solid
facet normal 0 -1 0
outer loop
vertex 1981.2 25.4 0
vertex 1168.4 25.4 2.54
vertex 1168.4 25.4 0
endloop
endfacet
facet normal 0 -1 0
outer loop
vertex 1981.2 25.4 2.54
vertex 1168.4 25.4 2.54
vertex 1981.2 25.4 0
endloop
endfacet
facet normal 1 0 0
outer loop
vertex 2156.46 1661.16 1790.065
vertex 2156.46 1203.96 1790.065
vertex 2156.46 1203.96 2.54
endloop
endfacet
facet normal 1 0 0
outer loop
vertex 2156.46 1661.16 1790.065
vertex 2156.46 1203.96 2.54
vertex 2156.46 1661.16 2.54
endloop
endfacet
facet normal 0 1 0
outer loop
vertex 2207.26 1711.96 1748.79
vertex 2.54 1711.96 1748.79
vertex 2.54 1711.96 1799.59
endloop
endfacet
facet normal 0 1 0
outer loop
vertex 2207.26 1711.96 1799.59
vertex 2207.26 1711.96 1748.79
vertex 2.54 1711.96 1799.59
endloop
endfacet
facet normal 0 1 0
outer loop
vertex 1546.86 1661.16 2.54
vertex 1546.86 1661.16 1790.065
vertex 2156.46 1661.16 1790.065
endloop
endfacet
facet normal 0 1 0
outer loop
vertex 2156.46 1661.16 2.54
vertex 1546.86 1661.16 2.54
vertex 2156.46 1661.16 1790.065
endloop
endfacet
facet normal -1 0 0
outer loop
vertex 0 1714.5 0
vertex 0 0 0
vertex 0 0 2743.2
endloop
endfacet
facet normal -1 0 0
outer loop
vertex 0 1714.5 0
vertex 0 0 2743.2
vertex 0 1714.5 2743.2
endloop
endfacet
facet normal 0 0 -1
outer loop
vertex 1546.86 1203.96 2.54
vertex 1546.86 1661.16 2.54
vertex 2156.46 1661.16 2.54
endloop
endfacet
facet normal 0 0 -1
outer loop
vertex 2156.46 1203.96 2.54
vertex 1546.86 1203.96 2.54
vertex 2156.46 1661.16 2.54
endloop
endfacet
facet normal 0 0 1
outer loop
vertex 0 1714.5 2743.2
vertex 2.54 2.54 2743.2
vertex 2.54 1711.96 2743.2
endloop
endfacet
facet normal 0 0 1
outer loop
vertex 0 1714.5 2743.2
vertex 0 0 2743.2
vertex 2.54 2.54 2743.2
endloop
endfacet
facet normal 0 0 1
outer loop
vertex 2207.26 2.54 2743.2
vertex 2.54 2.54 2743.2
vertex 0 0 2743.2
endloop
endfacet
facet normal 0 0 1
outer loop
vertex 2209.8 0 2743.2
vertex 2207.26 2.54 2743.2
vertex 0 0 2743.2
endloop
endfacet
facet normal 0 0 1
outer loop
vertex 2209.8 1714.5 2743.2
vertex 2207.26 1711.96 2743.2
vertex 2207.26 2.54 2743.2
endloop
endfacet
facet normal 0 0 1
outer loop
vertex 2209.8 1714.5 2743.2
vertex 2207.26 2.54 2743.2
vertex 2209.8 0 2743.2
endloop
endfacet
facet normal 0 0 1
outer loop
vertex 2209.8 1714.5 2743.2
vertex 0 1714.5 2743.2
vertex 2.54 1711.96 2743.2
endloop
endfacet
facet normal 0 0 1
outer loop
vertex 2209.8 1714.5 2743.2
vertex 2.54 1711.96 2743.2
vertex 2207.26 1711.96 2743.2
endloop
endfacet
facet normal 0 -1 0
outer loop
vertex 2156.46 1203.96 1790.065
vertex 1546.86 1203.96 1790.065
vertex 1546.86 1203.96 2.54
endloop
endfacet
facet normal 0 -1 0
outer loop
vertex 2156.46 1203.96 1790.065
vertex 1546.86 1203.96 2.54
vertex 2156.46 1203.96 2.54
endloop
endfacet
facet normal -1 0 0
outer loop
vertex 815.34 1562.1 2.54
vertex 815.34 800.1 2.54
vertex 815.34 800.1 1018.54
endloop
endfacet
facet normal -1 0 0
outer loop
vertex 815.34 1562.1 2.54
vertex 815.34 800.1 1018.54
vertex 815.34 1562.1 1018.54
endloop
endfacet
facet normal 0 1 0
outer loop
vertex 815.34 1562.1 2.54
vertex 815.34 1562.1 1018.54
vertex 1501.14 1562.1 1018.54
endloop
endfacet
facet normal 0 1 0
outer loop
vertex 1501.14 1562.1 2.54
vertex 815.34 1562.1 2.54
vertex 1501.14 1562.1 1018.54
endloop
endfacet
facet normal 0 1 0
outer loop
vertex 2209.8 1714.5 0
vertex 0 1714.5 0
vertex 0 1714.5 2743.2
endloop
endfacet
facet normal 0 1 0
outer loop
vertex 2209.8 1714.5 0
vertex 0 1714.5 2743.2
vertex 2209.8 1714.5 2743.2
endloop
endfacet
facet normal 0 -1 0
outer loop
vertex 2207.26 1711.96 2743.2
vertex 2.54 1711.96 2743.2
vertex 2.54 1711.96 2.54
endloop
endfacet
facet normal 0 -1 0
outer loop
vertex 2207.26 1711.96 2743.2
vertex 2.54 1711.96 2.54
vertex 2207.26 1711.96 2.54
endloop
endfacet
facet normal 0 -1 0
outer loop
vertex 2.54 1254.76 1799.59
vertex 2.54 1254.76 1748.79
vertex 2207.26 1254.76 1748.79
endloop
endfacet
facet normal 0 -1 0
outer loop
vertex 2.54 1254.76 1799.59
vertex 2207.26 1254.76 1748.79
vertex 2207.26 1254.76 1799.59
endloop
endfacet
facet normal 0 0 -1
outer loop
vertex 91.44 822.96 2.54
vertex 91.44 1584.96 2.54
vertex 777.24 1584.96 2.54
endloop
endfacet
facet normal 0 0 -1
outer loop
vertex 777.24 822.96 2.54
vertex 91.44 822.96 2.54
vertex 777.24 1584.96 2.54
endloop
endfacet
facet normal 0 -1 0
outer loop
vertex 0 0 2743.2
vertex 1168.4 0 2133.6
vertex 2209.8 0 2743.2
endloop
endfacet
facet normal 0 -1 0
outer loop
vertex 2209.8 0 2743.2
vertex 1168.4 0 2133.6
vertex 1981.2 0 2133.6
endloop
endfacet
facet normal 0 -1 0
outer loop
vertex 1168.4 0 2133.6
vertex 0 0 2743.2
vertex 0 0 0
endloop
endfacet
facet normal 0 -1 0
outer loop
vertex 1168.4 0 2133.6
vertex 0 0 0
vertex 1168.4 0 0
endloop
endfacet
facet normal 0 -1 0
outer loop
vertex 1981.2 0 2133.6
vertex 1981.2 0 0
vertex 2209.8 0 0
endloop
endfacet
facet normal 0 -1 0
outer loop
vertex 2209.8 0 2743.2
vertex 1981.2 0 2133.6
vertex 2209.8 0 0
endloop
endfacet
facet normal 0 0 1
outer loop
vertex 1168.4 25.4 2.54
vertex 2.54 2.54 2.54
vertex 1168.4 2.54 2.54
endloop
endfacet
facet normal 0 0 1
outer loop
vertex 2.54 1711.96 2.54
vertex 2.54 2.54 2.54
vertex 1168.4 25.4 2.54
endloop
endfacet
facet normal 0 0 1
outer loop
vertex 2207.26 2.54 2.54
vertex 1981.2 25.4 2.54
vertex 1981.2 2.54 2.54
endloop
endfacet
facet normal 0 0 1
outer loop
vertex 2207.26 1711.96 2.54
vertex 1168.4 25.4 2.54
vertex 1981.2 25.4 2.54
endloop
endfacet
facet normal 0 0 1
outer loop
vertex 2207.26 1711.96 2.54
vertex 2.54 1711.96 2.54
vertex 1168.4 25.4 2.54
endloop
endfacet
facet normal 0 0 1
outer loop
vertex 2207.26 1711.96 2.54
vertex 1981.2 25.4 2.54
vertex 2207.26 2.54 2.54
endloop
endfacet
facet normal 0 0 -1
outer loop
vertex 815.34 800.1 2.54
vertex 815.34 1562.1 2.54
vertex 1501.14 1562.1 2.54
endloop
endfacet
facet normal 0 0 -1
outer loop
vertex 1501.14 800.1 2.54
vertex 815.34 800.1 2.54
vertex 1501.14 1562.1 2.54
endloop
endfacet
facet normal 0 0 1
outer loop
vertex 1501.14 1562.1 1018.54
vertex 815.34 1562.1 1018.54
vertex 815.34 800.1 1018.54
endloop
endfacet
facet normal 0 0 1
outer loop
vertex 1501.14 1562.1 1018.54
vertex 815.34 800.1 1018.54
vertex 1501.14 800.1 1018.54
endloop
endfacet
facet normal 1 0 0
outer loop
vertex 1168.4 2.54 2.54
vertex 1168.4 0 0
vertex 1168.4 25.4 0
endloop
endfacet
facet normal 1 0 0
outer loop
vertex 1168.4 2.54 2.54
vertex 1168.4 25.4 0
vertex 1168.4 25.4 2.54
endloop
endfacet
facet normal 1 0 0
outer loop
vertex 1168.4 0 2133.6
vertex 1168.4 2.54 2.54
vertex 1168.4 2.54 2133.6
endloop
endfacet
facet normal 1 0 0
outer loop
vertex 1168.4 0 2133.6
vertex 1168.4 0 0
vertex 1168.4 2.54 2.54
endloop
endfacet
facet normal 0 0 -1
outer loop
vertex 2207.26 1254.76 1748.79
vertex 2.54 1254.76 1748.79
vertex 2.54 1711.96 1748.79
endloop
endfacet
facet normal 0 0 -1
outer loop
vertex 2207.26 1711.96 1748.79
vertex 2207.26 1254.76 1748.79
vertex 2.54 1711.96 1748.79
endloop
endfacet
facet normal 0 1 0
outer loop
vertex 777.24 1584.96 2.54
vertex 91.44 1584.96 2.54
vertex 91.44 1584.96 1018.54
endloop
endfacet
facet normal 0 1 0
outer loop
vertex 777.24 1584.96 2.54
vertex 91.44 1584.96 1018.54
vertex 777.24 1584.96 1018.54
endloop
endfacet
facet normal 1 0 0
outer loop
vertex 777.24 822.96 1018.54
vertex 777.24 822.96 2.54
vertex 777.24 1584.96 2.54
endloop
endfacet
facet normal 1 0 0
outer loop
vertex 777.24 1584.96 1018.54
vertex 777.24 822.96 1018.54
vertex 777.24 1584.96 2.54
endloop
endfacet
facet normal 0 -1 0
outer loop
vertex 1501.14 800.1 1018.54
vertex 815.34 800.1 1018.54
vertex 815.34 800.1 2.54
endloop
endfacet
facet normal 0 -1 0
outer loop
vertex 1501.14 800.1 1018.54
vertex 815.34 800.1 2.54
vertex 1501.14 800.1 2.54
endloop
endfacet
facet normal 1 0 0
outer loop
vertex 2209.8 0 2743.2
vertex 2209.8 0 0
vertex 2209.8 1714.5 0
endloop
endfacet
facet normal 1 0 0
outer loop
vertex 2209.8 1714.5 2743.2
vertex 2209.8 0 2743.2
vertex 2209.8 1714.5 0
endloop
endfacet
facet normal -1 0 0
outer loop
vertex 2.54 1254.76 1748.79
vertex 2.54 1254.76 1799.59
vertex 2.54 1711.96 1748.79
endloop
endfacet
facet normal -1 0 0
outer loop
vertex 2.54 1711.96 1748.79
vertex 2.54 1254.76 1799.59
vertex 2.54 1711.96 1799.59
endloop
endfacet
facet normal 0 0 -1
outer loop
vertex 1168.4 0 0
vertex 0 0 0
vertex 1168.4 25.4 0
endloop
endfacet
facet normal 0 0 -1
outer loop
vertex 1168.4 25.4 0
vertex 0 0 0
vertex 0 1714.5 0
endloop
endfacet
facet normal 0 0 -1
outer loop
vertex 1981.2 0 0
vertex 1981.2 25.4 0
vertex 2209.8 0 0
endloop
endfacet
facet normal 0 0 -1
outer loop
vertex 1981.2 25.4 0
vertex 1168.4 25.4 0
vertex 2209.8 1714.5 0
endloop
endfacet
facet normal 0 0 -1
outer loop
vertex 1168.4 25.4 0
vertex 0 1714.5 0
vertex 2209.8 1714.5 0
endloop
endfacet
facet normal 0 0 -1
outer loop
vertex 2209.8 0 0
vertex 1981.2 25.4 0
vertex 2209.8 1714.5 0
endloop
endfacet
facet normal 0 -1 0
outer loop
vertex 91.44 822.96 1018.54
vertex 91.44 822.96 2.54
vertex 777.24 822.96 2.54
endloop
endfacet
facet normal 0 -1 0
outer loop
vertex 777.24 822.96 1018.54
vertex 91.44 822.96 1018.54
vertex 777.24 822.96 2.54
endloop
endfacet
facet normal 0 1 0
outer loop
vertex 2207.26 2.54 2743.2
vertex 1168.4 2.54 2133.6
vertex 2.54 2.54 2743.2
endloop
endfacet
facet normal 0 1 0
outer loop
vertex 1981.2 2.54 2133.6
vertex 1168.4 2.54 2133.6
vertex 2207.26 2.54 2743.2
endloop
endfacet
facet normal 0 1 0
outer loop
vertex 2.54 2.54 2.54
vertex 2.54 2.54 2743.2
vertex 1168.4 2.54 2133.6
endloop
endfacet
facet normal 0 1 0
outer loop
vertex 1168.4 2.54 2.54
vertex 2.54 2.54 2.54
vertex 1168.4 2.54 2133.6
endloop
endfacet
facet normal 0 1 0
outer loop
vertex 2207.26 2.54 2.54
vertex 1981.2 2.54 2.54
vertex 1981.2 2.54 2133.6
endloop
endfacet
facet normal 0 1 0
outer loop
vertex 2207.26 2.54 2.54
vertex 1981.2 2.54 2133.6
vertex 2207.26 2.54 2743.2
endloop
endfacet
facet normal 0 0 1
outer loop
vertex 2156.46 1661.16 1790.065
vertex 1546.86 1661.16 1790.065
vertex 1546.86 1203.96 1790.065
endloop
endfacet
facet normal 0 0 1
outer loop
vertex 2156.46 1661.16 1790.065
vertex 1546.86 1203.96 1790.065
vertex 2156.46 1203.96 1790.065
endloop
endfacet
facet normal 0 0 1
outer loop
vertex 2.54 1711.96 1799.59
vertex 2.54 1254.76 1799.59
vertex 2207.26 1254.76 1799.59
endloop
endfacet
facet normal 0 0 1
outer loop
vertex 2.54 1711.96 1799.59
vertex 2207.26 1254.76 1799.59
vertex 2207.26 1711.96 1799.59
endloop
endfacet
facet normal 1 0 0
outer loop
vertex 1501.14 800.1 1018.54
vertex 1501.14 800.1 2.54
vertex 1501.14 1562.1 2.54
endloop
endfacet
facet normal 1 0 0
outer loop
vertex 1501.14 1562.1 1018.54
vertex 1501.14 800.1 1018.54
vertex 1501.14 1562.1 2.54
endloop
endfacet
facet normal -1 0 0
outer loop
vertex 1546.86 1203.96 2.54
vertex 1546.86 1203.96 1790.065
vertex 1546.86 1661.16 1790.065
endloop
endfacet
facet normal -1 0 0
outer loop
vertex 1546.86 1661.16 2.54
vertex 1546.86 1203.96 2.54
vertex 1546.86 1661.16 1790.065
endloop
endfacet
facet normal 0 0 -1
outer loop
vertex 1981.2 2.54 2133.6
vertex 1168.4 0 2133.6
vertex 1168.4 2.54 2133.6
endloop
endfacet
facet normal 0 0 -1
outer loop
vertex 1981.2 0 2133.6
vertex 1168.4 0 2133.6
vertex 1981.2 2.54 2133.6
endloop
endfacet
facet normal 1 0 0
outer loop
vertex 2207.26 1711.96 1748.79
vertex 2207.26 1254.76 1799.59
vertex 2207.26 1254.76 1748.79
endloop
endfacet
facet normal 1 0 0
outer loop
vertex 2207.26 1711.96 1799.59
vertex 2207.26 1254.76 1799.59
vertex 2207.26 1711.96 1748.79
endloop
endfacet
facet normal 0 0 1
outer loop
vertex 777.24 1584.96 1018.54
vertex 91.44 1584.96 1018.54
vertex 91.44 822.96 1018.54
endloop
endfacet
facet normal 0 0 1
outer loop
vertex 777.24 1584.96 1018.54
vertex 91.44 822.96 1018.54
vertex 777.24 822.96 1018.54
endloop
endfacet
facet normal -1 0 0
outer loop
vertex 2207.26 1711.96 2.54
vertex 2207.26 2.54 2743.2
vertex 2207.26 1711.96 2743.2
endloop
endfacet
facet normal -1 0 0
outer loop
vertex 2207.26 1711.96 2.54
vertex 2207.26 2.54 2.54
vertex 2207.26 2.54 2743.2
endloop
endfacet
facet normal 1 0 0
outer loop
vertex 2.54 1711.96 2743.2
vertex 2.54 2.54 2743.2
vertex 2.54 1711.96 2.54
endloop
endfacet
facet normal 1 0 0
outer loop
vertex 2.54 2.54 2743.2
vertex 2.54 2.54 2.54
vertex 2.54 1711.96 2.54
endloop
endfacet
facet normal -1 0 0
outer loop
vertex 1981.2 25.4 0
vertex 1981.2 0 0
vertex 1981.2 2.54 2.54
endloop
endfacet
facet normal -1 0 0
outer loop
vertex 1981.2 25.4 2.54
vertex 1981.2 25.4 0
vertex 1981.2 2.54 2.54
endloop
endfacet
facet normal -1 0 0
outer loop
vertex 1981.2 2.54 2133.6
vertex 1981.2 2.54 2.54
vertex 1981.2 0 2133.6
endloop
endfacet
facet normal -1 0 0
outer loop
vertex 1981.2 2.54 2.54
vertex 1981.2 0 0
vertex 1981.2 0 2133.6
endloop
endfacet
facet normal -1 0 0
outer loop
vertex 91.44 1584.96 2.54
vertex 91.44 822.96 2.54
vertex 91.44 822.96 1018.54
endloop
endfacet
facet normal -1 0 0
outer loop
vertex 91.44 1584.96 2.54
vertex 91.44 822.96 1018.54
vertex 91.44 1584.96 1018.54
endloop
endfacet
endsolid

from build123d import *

# Parameters (mm, degrees)
F0_W      = 2209.8
F0_H      = 1714.5
F1_DEPTH  = 2743.2
F2_T      = -2.54
F3_W      = 812.8
F3_H      = 2133.6
F4_DEPTH  = 25.4
F5_W      = 685.8
F5_H      = 762
F6_DEPTH  = 1016
F7_W      = 457.2
F7_H      = 50.8
F8_DEPTH  = 2204.72
F9_W      = 609.6
F9_H      = 457.2
F10_DEPTH = 1787.525


with BuildPart() as f1:
    # F0 (on Top) → F1 (new body)
    with BuildSketch(Plane.XY):
        with Locations((1104.9, 857.25)):
            Rectangle(F0_W, F0_H)
    extrude(amount=F1_DEPTH)

    # F2
    f2_openings = [f1.faces().sort_by_distance(p)[0] for p in [
        (1104.9, 857.25, 2743.2),
    ]]
    offset(amount=F2_T, openings=f2_openings)

    # F3 (on face) → F4 (cut)
    with BuildSketch(Plane.XZ):
        with Locations((1574.8, 1066.8)):
            Rectangle(F3_W, F3_H)
    extrude(amount=-F4_DEPTH, mode=Mode.SUBTRACT)


with BuildPart() as f6:
    # F5 (on face) → F6 (new body)
    with BuildSketch(Plane.XY.offset(2.54)):
        with Locations((434.34, 1203.96)):
            Rectangle(F5_W, F5_H)
    extrude(amount=F6_DEPTH)


with BuildPart() as f6b:
    # F5 (on face) → F6, piece 2 (new body)
    with BuildSketch(Plane.XY.offset(2.54)):
        with Locations((1158.24, 1181.1)):
            Rectangle(F5_W, F5_H)
    extrude(amount=F6_DEPTH)


with BuildPart() as f8:
    # F7 (on face) → F8 (new body, through all)
    with BuildSketch(Plane.YZ.offset(2.54)):
        with Locations((1483.36, 1774.19)):
            Rectangle(F7_W, F7_H)
    extrude(amount=F8_DEPTH)


with BuildPart() as f10:
    # F9 (on face) → F10 (new body)
    with BuildSketch(Plane.XY.offset(2.54)):
        with Locations((1851.66, 1432.56)):
            Rectangle(F9_W, F9_H)
    extrude(amount=F10_DEPTH)


solid = Compound([f1.part, f6.part, f6b.part, f8.part, f10.part])
